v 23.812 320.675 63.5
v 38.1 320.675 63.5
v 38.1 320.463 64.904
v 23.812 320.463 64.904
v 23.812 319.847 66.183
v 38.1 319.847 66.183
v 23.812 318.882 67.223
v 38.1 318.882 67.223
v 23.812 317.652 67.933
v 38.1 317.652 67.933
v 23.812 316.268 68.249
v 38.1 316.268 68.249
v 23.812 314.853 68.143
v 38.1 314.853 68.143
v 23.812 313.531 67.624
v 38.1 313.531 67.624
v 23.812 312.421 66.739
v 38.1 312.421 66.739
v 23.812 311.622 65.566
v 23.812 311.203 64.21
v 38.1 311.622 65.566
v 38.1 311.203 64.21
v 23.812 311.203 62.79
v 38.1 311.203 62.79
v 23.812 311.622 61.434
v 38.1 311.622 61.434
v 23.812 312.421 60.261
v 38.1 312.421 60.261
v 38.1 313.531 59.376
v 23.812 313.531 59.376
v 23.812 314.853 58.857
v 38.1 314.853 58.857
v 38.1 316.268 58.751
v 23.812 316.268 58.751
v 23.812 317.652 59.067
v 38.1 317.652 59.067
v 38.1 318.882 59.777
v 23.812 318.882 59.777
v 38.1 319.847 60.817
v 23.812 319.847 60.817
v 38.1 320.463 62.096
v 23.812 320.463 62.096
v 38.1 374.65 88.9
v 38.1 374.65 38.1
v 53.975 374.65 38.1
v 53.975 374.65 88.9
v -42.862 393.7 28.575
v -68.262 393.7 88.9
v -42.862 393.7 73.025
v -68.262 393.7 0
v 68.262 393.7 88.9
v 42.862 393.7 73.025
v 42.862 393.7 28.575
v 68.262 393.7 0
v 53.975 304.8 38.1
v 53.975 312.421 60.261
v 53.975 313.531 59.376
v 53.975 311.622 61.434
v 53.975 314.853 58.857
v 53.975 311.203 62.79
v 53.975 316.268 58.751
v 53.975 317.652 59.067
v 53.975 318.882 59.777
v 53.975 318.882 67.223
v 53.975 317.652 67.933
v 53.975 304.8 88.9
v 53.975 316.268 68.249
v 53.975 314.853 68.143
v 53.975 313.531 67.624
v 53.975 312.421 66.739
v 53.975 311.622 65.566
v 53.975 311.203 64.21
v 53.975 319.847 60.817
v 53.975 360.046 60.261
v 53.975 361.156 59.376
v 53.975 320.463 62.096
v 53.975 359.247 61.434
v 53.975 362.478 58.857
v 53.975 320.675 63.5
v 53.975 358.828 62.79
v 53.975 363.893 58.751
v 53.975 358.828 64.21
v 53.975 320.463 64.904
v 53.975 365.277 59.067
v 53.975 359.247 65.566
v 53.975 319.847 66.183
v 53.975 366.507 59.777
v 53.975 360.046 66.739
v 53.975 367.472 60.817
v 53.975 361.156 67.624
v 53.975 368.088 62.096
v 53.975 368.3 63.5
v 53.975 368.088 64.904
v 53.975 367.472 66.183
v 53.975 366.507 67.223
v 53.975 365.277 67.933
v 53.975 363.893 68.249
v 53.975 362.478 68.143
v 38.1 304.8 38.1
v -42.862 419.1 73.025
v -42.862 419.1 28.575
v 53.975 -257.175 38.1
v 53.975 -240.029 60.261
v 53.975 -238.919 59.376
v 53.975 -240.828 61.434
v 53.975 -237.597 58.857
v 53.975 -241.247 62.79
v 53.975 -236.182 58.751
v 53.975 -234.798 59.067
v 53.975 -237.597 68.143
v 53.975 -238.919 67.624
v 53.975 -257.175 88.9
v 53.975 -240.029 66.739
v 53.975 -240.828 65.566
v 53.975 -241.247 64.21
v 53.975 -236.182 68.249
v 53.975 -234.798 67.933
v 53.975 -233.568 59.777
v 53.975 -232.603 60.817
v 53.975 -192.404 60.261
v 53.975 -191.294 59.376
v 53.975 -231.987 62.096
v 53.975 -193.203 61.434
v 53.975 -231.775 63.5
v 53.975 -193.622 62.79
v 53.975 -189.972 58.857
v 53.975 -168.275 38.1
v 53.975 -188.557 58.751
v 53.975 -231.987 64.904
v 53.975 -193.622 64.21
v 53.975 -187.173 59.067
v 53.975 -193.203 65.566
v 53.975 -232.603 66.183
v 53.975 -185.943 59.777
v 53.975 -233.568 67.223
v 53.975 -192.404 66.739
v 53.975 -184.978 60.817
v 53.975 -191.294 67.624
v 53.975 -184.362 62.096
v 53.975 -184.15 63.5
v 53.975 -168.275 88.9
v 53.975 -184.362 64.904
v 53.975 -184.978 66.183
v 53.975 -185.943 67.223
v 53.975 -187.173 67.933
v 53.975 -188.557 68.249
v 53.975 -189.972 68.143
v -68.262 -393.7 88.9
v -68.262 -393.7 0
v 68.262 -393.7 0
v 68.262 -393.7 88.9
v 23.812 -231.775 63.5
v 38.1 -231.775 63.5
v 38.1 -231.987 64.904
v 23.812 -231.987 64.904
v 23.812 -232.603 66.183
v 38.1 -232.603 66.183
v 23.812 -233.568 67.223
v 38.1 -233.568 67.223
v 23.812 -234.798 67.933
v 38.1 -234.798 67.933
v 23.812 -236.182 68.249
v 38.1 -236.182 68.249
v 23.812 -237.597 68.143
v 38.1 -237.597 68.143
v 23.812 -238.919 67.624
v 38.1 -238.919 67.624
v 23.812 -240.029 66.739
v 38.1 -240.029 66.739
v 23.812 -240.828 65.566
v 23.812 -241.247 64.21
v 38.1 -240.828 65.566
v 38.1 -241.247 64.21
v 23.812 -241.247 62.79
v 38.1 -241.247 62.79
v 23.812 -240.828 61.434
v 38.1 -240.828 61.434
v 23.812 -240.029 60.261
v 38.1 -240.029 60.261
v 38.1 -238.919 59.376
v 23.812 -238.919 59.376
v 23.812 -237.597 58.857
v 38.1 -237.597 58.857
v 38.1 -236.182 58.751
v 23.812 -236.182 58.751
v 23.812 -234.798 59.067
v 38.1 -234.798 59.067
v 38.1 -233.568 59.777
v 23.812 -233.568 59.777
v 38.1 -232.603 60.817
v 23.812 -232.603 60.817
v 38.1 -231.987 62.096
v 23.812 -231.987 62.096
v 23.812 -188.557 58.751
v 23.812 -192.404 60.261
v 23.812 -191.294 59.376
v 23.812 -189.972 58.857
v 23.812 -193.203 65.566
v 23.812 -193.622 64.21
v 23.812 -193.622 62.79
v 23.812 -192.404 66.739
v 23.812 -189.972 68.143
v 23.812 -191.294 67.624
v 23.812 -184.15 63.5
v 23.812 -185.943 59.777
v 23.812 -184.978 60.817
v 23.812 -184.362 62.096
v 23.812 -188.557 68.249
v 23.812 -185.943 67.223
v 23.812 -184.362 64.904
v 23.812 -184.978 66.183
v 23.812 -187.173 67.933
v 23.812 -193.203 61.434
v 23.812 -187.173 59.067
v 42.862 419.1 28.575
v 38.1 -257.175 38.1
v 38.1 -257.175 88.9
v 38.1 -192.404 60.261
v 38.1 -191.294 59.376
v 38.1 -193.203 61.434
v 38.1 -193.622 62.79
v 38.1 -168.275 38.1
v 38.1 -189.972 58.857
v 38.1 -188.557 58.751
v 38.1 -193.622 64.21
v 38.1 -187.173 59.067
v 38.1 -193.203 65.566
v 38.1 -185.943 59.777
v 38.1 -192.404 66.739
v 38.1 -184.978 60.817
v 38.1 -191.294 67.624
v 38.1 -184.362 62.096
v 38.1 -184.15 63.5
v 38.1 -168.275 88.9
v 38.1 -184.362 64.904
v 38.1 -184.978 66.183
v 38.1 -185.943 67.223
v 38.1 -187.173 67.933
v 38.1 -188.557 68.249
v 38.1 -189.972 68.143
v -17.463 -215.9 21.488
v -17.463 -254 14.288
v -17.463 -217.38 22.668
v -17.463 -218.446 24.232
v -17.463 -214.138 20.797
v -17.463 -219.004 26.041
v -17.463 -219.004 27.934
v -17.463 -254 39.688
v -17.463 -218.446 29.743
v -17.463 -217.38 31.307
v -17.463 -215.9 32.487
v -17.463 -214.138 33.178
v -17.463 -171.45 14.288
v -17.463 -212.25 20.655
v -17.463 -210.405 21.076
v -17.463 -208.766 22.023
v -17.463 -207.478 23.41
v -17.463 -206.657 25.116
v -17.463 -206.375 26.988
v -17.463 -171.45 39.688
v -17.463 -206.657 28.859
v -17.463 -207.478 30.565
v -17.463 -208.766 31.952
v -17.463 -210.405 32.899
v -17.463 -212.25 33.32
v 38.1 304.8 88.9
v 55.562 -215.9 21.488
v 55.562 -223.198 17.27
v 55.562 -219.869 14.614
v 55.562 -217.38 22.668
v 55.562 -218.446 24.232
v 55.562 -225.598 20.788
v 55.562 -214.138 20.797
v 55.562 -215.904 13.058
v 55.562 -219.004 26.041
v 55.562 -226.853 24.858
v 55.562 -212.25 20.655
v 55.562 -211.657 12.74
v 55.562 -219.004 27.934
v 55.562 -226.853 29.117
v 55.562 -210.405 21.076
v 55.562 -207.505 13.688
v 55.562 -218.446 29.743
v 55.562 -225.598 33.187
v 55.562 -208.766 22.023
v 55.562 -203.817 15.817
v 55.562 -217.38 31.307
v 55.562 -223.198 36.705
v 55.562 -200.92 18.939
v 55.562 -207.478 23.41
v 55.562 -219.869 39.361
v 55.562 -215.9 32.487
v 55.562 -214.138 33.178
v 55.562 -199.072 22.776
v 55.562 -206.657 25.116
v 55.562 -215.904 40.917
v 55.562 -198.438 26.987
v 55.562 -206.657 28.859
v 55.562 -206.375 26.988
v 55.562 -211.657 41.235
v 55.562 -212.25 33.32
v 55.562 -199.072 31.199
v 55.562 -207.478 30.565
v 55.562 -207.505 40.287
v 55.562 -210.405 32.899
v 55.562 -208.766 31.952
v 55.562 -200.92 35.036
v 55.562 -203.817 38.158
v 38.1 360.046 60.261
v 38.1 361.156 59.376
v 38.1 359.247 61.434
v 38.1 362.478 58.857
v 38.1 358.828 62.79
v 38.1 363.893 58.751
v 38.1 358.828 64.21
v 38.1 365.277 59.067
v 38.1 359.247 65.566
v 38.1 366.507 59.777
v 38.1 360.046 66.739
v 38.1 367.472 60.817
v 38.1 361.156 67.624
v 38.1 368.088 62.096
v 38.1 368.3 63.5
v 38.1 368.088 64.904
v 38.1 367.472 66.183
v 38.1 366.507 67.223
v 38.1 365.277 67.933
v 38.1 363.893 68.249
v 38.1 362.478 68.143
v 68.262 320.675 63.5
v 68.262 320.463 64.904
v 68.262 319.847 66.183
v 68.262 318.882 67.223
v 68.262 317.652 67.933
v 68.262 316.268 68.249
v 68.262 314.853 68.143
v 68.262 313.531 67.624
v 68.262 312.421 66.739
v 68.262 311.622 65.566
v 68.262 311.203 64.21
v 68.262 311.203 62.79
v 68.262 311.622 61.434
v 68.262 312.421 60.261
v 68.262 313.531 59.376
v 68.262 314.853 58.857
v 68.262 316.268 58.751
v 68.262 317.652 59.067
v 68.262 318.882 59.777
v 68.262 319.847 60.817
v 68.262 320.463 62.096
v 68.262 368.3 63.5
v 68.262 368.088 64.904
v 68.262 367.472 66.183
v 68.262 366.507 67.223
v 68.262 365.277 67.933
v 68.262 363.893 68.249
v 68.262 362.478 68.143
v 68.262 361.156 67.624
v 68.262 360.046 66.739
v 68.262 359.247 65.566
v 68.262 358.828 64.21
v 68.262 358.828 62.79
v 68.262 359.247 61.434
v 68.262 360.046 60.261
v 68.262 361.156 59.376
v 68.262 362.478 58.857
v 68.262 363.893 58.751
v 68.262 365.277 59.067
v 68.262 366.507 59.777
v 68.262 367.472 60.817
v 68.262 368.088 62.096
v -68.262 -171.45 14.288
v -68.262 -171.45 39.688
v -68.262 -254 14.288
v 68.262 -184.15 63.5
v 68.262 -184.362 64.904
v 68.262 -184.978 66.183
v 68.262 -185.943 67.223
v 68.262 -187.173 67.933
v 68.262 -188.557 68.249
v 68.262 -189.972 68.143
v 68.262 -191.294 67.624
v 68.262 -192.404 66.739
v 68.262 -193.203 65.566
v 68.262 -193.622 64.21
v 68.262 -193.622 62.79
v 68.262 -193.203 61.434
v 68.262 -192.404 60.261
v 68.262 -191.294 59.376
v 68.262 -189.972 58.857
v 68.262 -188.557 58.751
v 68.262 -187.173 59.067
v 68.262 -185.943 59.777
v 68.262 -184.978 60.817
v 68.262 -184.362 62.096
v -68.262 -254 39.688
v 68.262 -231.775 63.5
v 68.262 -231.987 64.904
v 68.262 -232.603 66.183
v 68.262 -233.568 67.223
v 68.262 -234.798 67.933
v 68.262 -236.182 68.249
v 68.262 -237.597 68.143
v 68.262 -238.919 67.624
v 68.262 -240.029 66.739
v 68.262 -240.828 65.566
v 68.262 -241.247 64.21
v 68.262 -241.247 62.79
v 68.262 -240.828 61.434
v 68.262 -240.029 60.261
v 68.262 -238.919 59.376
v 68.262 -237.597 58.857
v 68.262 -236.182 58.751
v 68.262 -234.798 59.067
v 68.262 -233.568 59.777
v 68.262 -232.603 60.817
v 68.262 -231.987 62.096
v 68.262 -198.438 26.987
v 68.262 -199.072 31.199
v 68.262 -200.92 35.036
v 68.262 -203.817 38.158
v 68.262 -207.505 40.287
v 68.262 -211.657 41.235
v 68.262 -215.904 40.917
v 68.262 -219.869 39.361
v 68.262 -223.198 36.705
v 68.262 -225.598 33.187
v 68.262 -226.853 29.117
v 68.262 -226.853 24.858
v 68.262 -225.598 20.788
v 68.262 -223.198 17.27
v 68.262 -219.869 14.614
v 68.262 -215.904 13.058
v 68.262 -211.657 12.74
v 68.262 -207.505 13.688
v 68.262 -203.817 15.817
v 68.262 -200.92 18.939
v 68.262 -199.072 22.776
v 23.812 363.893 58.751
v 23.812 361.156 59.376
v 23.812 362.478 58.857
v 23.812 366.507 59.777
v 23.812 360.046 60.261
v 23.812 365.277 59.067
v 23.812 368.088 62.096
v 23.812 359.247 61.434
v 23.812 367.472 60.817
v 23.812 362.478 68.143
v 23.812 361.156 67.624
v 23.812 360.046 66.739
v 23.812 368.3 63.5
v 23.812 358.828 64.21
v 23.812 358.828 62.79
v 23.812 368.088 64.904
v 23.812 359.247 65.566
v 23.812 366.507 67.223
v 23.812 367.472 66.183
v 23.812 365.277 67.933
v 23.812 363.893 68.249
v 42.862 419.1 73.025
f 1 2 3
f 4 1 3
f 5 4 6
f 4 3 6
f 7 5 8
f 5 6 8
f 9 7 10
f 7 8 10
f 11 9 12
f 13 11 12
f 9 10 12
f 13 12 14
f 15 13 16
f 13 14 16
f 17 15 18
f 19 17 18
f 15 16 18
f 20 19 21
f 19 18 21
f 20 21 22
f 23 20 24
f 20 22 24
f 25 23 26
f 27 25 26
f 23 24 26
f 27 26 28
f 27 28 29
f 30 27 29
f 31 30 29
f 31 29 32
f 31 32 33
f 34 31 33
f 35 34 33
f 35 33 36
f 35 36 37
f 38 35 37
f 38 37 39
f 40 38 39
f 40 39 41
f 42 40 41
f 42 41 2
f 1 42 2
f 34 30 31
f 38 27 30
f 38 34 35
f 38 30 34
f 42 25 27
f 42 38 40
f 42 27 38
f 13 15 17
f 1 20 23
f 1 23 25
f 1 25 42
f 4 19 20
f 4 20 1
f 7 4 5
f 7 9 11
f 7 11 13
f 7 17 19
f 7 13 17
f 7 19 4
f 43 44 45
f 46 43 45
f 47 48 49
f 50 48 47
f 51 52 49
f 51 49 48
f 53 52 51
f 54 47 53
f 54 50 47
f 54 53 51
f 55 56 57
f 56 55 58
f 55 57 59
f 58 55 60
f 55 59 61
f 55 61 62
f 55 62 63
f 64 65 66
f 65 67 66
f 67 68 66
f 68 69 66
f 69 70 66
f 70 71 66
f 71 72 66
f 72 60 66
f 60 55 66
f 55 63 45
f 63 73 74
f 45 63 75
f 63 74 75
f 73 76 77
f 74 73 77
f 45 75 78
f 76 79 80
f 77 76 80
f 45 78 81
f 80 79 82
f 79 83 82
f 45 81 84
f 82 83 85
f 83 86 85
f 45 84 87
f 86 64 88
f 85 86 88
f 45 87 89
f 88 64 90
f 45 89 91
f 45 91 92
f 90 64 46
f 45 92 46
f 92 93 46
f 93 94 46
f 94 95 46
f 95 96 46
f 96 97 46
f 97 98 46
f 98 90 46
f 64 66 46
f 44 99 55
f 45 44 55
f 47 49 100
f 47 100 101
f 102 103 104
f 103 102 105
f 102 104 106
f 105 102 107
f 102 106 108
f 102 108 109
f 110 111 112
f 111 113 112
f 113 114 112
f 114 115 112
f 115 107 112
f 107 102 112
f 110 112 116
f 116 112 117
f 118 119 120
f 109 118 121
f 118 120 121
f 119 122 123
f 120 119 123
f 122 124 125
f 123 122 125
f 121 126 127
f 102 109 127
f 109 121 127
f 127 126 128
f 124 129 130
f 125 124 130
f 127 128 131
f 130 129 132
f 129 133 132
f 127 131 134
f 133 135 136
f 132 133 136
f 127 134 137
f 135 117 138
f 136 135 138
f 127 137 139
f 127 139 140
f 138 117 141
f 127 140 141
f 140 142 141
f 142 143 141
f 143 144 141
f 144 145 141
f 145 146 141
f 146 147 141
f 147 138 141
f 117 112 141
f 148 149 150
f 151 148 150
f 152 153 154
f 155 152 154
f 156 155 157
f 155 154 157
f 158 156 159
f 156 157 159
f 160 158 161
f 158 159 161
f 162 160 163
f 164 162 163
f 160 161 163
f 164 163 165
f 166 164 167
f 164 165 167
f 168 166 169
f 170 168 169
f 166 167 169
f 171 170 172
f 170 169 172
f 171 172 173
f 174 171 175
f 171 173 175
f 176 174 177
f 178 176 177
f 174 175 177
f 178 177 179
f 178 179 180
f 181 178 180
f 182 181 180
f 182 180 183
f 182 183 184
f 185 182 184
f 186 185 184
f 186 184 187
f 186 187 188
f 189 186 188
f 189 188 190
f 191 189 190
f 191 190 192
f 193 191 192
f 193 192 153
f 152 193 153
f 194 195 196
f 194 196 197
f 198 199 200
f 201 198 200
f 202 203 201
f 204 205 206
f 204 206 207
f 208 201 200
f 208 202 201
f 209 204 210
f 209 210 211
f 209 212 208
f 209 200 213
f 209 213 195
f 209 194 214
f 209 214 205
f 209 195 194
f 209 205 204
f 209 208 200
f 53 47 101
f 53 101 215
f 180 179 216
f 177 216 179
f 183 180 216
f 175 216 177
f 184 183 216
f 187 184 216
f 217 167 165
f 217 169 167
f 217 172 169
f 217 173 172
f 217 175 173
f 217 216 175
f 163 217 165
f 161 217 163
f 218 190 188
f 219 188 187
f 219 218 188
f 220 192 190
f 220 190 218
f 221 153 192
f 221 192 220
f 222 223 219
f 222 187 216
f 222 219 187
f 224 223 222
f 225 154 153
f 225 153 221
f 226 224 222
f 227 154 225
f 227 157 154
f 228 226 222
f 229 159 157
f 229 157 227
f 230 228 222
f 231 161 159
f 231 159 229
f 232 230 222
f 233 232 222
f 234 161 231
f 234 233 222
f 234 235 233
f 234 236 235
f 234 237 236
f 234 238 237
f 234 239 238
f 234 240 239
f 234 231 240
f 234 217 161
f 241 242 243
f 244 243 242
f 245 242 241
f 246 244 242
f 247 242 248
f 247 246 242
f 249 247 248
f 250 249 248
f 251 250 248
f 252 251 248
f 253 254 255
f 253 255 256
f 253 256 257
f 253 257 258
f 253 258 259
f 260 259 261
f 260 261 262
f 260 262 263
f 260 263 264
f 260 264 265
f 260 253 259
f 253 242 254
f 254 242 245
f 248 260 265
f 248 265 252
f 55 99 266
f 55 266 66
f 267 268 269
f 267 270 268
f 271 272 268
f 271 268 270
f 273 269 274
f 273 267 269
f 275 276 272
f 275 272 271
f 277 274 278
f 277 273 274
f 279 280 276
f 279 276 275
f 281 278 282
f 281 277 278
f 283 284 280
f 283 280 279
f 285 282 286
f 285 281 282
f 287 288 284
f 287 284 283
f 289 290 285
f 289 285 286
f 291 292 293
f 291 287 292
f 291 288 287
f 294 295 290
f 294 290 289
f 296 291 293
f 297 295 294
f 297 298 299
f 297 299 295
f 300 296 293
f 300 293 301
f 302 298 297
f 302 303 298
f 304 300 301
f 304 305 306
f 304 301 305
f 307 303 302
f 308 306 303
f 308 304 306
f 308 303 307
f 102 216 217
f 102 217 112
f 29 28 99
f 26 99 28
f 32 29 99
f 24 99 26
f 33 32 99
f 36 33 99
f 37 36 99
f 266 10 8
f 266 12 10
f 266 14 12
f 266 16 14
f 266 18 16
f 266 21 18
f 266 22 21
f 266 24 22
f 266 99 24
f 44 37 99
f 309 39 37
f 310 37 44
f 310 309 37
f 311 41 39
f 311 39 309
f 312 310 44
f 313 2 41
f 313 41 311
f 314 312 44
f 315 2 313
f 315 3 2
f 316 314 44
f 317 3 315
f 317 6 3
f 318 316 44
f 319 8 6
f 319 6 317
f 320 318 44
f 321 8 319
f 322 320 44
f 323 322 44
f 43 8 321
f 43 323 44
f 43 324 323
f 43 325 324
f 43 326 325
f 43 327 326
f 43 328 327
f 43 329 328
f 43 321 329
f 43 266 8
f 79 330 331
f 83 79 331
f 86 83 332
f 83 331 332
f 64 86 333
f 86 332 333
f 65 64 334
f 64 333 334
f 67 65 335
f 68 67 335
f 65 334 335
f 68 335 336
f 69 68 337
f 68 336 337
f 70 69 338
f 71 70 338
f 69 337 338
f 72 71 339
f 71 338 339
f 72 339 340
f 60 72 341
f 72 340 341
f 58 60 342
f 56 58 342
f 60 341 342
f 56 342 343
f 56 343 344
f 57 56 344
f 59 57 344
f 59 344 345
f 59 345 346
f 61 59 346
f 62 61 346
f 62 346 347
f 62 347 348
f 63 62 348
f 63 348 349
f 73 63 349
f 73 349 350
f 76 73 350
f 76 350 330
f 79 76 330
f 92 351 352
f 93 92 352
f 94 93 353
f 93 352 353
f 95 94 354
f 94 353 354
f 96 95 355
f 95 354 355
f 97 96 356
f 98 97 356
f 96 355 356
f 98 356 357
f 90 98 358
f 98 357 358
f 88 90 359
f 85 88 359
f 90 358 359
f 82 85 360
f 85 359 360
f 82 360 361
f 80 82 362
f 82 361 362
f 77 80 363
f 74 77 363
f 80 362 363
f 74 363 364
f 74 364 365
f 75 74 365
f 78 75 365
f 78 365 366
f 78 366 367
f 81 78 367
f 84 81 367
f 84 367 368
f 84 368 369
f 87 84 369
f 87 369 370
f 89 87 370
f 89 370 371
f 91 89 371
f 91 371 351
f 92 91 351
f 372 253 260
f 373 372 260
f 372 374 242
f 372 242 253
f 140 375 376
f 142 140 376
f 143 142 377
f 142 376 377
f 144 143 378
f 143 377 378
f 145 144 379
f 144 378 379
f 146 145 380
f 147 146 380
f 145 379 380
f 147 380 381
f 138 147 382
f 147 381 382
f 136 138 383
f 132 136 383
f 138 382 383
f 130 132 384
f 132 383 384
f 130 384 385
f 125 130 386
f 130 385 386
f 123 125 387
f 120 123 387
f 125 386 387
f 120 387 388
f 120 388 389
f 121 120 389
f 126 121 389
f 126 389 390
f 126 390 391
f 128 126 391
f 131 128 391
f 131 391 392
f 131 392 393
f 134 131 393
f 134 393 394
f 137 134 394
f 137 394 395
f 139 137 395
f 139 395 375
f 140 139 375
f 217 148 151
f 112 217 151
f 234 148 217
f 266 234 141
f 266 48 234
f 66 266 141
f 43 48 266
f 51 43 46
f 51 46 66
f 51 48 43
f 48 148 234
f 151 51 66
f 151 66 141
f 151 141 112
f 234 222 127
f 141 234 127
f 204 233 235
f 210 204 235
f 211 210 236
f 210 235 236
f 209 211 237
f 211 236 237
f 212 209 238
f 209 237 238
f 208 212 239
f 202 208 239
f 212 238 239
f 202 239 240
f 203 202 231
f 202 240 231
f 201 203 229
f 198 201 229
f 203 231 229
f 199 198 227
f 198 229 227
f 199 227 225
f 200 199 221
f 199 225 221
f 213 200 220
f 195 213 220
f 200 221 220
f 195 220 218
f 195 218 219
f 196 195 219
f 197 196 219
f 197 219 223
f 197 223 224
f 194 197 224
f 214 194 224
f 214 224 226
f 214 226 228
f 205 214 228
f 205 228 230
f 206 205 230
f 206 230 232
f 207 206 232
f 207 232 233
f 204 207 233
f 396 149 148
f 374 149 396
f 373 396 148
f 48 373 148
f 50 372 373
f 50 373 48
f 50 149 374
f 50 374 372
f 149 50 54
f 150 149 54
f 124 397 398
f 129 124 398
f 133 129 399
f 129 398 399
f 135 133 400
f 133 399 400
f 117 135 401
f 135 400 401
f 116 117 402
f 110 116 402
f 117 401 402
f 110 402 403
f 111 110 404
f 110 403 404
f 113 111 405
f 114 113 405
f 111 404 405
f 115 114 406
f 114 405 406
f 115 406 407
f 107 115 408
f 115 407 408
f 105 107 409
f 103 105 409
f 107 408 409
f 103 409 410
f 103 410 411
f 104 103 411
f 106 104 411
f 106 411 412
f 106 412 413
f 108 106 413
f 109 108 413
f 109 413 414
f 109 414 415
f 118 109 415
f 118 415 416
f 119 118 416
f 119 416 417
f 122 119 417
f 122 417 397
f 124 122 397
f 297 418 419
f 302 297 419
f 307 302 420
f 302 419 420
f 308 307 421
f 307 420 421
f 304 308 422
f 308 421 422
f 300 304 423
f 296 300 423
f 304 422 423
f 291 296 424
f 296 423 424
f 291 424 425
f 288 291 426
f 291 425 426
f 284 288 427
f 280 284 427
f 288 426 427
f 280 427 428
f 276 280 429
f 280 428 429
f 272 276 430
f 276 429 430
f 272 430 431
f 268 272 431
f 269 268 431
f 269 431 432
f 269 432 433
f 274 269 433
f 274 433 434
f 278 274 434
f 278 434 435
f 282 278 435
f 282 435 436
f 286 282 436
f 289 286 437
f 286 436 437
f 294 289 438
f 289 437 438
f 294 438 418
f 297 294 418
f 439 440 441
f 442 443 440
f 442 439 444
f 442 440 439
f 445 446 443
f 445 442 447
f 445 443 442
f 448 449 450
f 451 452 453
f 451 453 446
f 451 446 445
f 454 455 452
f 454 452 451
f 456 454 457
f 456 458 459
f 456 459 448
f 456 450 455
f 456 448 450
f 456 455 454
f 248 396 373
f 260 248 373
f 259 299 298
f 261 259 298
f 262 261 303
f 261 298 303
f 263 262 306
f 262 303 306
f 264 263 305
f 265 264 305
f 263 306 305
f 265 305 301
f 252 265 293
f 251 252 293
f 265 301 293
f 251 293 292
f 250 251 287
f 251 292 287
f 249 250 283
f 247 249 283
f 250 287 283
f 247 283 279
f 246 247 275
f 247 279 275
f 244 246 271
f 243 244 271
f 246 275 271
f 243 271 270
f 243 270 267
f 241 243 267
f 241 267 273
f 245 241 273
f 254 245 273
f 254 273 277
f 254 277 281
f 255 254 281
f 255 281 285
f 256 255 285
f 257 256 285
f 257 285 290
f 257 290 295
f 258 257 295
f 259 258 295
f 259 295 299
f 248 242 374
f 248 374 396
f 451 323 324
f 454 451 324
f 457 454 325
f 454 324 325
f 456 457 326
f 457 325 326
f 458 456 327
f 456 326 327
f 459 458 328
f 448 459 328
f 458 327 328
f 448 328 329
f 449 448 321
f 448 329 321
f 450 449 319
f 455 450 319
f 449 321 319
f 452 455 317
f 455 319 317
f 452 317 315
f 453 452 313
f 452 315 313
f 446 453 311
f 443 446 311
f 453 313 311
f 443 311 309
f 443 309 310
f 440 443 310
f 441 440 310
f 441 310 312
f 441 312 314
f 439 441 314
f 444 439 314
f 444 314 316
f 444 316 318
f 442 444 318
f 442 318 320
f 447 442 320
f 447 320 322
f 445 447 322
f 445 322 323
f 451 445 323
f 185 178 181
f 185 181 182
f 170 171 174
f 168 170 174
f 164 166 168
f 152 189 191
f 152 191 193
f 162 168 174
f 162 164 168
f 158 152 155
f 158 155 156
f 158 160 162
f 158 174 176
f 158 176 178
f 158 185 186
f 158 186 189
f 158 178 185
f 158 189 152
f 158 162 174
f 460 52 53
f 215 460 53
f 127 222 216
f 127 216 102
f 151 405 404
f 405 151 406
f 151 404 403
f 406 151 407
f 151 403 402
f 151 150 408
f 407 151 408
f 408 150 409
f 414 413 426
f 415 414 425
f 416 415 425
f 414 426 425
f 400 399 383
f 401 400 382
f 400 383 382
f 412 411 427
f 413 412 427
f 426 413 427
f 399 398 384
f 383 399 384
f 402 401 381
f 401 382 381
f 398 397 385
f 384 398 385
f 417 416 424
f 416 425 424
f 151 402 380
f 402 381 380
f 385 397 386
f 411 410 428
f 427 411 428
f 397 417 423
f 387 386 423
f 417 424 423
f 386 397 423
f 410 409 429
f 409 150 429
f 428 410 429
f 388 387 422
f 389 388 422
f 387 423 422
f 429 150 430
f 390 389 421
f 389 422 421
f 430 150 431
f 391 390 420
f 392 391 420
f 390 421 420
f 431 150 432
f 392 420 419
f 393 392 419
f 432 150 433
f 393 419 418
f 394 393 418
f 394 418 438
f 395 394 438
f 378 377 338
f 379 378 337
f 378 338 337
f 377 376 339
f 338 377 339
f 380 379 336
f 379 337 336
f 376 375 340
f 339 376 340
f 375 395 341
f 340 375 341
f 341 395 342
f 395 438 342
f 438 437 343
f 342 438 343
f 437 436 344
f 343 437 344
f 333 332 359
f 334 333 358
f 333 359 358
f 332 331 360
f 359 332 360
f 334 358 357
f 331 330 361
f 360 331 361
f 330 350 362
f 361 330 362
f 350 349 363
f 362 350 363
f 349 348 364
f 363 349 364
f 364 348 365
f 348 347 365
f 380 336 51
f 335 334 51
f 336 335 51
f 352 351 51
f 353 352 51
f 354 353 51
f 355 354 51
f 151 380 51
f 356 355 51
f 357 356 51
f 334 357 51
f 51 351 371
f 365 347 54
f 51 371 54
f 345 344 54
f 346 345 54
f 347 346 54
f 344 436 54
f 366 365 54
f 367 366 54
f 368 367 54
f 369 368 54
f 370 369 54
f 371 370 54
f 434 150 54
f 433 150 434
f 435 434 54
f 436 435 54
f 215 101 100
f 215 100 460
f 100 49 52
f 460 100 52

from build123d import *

# Parameters (mm, degrees)
SKETCH2_W           = 136.525
SKETCH2_H           = 787.4
BOSS_EXTRUDE1_DEPTH = 88.9
SKETCH4_W           = 85.725
SKETCH4_H           = 44.45
BOSS_EXTRUDE2_DEPTH = 25.4
SKETCH5_W           = 25.4
SKETCH5_H           = 82.55
CUT_EXTRUDE1_DEPTH  = 50.8
SKETCH6_W           = 15.875
SKETCH6_H           = 69.85
SKETCH6_H_2         = 88.9
CUT_EXTRUDE2_DEPTH  = 50.8
SKETCH7_R           = 4.7625
CUT_EXTRUDE3_DEPTH  = 44.45
SKETCH7_3_R         = 14.2875
CUT_EXTRUDE4_DEPTH  = 12.7
SKETCH7_4_R         = 6.35
CUT_EXTRUDE5_DEPTH  = 450.652194062


with BuildPart() as part:
    # Sketch2 → Boss-Extrude1 (new body)
    with BuildSketch(Plane.XY):
        Rectangle(SKETCH2_W, SKETCH2_H)
    extrude(amount=BOSS_EXTRUDE1_DEPTH)

    # Sketch4 → Boss-Extrude2 (add)
    with BuildSketch(Plane(origin=(0, 393.7, 0), x_dir=(1, 0, 0), z_dir=(0, 1, 0))):
        with Locations((0, -50.8)):
            Rectangle(SKETCH4_W, SKETCH4_H)
    extrude(amount=BOSS_EXTRUDE2_DEPTH)

    # Sketch5 → Cut-Extrude1 (cut)
    with BuildSketch(Plane.ZY.offset(68.2625)):
        with Locations((26.9875, -212.725)):
            Rectangle(SKETCH5_W, SKETCH5_H)
    extrude(amount=-CUT_EXTRUDE1_DEPTH, mode=Mode.SUBTRACT)

    # Sketch6 → Cut-Extrude2 (cut)
    with BuildSketch(Plane.XY.offset(88.9)):
        with Locations((46.0375, 339.725)):
            Rectangle(SKETCH6_W, SKETCH6_H)
        with Locations((46.0375, -212.725)):
            Rectangle(SKETCH6_W, SKETCH6_H_2)
    extrude(amount=-CUT_EXTRUDE2_DEPTH, mode=Mode.SUBTRACT)

    # Sketch7 → Cut-Extrude3 (cut)
    with BuildSketch(Plane(origin=(68.2625, 0, 0), x_dir=(0, 0, -1), z_dir=(1, 0, 0))):
        with Locations((-63.5, -188.9125)):
            Circle(SKETCH7_R)
        with Locations((-63.5, -236.5375)):
            Circle(SKETCH7_R)
        with Locations((-63.5, 315.9125)):
            Circle(SKETCH7_R)
        with Locations((-63.5, 363.5375)):
            Circle(SKETCH7_R)
    extrude(amount=-CUT_EXTRUDE3_DEPTH, mode=Mode.SUBTRACT)

    # Sketch7<3> → Cut-Extrude4 (cut)
    with BuildSketch(Plane(origin=(68.2625, 0, 0), x_dir=(0, 0, -1), z_dir=(1, 0, 0))):
        with Locations((-26.9875, -212.725)):
            Circle(SKETCH7_3_R)
    extrude(amount=-CUT_EXTRUDE4_DEPTH, mode=Mode.SUBTRACT)

    # Sketch7<4> → Cut-Extrude5 (cut, through all)
    with BuildSketch(Plane(origin=(68.2625, 0, 0), x_dir=(0, 0, -1), z_dir=(1, 0, 0))):
        with Locations((-26.9875, -212.725)):
            Circle(SKETCH7_4_R)
    extrude(amount=-CUT_EXTRUDE5_DEPTH, mode=Mode.SUBTRACT)


solid = part.part
